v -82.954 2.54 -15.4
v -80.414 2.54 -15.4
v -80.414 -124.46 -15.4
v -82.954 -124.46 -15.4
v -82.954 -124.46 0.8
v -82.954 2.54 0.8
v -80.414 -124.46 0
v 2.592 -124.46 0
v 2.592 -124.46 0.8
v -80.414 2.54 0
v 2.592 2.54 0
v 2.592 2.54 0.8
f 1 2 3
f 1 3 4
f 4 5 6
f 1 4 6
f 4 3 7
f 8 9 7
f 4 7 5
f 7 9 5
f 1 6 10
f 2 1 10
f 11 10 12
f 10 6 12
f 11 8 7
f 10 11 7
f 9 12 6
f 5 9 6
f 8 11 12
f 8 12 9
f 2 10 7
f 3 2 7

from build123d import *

# Parameters (mm, degrees)
BOSS_EXTRUDE1_DEPTH = 0.8
BOSS_EXTRUDE2_DEPTH = 0.8
BOSS_EXTRUDE3_DEPTH = 15.4


with BuildPart() as part:
    # Sketch1 → Boss-Extrude1 (new body)
    with BuildSketch(Plane.XY):
        Polygon((2.591679003, 2.54), (2.591679003, -124.46), (-72.414230485, -124.46), (-72.414230485, -121.92), (-72.414230485, 2.54), align=None)
    extrude(amount=BOSS_EXTRUDE1_DEPTH)

    # Sketch2 → Boss-Extrude2 (add)
    with BuildSketch(Plane.XY):
        Polygon((-72.414230485, -124.46), (-80.414230485, -124.46), (-82.954230485, -124.46), (-82.954230485, -112.46), (-82.954230485, 2.54), (-72.414230485, 2.54), (-72.414230485, -9.46), (-72.414230485, -112.46), align=None)
    extrude(amount=BOSS_EXTRUDE2_DEPTH)

    # Sketch3 → Boss-Extrude3 (add)
    with BuildSketch(Plane(origin=(0, 0, 0), x_dir=(-1, 0, 0), z_dir=(0, 0, -1))):
        Polygon((82.954230485, 2.54), (80.414230485, 2.54), (80.414230485, -9.46), (80.414230485, -112.46), (80.414230485, -124.46), (82.954230485, -124.46), (82.954230485, -112.46), (82.954230485, -9.46), align=None)
    extrude(amount=BOSS_EXTRUDE3_DEPTH)


solid = part.part
